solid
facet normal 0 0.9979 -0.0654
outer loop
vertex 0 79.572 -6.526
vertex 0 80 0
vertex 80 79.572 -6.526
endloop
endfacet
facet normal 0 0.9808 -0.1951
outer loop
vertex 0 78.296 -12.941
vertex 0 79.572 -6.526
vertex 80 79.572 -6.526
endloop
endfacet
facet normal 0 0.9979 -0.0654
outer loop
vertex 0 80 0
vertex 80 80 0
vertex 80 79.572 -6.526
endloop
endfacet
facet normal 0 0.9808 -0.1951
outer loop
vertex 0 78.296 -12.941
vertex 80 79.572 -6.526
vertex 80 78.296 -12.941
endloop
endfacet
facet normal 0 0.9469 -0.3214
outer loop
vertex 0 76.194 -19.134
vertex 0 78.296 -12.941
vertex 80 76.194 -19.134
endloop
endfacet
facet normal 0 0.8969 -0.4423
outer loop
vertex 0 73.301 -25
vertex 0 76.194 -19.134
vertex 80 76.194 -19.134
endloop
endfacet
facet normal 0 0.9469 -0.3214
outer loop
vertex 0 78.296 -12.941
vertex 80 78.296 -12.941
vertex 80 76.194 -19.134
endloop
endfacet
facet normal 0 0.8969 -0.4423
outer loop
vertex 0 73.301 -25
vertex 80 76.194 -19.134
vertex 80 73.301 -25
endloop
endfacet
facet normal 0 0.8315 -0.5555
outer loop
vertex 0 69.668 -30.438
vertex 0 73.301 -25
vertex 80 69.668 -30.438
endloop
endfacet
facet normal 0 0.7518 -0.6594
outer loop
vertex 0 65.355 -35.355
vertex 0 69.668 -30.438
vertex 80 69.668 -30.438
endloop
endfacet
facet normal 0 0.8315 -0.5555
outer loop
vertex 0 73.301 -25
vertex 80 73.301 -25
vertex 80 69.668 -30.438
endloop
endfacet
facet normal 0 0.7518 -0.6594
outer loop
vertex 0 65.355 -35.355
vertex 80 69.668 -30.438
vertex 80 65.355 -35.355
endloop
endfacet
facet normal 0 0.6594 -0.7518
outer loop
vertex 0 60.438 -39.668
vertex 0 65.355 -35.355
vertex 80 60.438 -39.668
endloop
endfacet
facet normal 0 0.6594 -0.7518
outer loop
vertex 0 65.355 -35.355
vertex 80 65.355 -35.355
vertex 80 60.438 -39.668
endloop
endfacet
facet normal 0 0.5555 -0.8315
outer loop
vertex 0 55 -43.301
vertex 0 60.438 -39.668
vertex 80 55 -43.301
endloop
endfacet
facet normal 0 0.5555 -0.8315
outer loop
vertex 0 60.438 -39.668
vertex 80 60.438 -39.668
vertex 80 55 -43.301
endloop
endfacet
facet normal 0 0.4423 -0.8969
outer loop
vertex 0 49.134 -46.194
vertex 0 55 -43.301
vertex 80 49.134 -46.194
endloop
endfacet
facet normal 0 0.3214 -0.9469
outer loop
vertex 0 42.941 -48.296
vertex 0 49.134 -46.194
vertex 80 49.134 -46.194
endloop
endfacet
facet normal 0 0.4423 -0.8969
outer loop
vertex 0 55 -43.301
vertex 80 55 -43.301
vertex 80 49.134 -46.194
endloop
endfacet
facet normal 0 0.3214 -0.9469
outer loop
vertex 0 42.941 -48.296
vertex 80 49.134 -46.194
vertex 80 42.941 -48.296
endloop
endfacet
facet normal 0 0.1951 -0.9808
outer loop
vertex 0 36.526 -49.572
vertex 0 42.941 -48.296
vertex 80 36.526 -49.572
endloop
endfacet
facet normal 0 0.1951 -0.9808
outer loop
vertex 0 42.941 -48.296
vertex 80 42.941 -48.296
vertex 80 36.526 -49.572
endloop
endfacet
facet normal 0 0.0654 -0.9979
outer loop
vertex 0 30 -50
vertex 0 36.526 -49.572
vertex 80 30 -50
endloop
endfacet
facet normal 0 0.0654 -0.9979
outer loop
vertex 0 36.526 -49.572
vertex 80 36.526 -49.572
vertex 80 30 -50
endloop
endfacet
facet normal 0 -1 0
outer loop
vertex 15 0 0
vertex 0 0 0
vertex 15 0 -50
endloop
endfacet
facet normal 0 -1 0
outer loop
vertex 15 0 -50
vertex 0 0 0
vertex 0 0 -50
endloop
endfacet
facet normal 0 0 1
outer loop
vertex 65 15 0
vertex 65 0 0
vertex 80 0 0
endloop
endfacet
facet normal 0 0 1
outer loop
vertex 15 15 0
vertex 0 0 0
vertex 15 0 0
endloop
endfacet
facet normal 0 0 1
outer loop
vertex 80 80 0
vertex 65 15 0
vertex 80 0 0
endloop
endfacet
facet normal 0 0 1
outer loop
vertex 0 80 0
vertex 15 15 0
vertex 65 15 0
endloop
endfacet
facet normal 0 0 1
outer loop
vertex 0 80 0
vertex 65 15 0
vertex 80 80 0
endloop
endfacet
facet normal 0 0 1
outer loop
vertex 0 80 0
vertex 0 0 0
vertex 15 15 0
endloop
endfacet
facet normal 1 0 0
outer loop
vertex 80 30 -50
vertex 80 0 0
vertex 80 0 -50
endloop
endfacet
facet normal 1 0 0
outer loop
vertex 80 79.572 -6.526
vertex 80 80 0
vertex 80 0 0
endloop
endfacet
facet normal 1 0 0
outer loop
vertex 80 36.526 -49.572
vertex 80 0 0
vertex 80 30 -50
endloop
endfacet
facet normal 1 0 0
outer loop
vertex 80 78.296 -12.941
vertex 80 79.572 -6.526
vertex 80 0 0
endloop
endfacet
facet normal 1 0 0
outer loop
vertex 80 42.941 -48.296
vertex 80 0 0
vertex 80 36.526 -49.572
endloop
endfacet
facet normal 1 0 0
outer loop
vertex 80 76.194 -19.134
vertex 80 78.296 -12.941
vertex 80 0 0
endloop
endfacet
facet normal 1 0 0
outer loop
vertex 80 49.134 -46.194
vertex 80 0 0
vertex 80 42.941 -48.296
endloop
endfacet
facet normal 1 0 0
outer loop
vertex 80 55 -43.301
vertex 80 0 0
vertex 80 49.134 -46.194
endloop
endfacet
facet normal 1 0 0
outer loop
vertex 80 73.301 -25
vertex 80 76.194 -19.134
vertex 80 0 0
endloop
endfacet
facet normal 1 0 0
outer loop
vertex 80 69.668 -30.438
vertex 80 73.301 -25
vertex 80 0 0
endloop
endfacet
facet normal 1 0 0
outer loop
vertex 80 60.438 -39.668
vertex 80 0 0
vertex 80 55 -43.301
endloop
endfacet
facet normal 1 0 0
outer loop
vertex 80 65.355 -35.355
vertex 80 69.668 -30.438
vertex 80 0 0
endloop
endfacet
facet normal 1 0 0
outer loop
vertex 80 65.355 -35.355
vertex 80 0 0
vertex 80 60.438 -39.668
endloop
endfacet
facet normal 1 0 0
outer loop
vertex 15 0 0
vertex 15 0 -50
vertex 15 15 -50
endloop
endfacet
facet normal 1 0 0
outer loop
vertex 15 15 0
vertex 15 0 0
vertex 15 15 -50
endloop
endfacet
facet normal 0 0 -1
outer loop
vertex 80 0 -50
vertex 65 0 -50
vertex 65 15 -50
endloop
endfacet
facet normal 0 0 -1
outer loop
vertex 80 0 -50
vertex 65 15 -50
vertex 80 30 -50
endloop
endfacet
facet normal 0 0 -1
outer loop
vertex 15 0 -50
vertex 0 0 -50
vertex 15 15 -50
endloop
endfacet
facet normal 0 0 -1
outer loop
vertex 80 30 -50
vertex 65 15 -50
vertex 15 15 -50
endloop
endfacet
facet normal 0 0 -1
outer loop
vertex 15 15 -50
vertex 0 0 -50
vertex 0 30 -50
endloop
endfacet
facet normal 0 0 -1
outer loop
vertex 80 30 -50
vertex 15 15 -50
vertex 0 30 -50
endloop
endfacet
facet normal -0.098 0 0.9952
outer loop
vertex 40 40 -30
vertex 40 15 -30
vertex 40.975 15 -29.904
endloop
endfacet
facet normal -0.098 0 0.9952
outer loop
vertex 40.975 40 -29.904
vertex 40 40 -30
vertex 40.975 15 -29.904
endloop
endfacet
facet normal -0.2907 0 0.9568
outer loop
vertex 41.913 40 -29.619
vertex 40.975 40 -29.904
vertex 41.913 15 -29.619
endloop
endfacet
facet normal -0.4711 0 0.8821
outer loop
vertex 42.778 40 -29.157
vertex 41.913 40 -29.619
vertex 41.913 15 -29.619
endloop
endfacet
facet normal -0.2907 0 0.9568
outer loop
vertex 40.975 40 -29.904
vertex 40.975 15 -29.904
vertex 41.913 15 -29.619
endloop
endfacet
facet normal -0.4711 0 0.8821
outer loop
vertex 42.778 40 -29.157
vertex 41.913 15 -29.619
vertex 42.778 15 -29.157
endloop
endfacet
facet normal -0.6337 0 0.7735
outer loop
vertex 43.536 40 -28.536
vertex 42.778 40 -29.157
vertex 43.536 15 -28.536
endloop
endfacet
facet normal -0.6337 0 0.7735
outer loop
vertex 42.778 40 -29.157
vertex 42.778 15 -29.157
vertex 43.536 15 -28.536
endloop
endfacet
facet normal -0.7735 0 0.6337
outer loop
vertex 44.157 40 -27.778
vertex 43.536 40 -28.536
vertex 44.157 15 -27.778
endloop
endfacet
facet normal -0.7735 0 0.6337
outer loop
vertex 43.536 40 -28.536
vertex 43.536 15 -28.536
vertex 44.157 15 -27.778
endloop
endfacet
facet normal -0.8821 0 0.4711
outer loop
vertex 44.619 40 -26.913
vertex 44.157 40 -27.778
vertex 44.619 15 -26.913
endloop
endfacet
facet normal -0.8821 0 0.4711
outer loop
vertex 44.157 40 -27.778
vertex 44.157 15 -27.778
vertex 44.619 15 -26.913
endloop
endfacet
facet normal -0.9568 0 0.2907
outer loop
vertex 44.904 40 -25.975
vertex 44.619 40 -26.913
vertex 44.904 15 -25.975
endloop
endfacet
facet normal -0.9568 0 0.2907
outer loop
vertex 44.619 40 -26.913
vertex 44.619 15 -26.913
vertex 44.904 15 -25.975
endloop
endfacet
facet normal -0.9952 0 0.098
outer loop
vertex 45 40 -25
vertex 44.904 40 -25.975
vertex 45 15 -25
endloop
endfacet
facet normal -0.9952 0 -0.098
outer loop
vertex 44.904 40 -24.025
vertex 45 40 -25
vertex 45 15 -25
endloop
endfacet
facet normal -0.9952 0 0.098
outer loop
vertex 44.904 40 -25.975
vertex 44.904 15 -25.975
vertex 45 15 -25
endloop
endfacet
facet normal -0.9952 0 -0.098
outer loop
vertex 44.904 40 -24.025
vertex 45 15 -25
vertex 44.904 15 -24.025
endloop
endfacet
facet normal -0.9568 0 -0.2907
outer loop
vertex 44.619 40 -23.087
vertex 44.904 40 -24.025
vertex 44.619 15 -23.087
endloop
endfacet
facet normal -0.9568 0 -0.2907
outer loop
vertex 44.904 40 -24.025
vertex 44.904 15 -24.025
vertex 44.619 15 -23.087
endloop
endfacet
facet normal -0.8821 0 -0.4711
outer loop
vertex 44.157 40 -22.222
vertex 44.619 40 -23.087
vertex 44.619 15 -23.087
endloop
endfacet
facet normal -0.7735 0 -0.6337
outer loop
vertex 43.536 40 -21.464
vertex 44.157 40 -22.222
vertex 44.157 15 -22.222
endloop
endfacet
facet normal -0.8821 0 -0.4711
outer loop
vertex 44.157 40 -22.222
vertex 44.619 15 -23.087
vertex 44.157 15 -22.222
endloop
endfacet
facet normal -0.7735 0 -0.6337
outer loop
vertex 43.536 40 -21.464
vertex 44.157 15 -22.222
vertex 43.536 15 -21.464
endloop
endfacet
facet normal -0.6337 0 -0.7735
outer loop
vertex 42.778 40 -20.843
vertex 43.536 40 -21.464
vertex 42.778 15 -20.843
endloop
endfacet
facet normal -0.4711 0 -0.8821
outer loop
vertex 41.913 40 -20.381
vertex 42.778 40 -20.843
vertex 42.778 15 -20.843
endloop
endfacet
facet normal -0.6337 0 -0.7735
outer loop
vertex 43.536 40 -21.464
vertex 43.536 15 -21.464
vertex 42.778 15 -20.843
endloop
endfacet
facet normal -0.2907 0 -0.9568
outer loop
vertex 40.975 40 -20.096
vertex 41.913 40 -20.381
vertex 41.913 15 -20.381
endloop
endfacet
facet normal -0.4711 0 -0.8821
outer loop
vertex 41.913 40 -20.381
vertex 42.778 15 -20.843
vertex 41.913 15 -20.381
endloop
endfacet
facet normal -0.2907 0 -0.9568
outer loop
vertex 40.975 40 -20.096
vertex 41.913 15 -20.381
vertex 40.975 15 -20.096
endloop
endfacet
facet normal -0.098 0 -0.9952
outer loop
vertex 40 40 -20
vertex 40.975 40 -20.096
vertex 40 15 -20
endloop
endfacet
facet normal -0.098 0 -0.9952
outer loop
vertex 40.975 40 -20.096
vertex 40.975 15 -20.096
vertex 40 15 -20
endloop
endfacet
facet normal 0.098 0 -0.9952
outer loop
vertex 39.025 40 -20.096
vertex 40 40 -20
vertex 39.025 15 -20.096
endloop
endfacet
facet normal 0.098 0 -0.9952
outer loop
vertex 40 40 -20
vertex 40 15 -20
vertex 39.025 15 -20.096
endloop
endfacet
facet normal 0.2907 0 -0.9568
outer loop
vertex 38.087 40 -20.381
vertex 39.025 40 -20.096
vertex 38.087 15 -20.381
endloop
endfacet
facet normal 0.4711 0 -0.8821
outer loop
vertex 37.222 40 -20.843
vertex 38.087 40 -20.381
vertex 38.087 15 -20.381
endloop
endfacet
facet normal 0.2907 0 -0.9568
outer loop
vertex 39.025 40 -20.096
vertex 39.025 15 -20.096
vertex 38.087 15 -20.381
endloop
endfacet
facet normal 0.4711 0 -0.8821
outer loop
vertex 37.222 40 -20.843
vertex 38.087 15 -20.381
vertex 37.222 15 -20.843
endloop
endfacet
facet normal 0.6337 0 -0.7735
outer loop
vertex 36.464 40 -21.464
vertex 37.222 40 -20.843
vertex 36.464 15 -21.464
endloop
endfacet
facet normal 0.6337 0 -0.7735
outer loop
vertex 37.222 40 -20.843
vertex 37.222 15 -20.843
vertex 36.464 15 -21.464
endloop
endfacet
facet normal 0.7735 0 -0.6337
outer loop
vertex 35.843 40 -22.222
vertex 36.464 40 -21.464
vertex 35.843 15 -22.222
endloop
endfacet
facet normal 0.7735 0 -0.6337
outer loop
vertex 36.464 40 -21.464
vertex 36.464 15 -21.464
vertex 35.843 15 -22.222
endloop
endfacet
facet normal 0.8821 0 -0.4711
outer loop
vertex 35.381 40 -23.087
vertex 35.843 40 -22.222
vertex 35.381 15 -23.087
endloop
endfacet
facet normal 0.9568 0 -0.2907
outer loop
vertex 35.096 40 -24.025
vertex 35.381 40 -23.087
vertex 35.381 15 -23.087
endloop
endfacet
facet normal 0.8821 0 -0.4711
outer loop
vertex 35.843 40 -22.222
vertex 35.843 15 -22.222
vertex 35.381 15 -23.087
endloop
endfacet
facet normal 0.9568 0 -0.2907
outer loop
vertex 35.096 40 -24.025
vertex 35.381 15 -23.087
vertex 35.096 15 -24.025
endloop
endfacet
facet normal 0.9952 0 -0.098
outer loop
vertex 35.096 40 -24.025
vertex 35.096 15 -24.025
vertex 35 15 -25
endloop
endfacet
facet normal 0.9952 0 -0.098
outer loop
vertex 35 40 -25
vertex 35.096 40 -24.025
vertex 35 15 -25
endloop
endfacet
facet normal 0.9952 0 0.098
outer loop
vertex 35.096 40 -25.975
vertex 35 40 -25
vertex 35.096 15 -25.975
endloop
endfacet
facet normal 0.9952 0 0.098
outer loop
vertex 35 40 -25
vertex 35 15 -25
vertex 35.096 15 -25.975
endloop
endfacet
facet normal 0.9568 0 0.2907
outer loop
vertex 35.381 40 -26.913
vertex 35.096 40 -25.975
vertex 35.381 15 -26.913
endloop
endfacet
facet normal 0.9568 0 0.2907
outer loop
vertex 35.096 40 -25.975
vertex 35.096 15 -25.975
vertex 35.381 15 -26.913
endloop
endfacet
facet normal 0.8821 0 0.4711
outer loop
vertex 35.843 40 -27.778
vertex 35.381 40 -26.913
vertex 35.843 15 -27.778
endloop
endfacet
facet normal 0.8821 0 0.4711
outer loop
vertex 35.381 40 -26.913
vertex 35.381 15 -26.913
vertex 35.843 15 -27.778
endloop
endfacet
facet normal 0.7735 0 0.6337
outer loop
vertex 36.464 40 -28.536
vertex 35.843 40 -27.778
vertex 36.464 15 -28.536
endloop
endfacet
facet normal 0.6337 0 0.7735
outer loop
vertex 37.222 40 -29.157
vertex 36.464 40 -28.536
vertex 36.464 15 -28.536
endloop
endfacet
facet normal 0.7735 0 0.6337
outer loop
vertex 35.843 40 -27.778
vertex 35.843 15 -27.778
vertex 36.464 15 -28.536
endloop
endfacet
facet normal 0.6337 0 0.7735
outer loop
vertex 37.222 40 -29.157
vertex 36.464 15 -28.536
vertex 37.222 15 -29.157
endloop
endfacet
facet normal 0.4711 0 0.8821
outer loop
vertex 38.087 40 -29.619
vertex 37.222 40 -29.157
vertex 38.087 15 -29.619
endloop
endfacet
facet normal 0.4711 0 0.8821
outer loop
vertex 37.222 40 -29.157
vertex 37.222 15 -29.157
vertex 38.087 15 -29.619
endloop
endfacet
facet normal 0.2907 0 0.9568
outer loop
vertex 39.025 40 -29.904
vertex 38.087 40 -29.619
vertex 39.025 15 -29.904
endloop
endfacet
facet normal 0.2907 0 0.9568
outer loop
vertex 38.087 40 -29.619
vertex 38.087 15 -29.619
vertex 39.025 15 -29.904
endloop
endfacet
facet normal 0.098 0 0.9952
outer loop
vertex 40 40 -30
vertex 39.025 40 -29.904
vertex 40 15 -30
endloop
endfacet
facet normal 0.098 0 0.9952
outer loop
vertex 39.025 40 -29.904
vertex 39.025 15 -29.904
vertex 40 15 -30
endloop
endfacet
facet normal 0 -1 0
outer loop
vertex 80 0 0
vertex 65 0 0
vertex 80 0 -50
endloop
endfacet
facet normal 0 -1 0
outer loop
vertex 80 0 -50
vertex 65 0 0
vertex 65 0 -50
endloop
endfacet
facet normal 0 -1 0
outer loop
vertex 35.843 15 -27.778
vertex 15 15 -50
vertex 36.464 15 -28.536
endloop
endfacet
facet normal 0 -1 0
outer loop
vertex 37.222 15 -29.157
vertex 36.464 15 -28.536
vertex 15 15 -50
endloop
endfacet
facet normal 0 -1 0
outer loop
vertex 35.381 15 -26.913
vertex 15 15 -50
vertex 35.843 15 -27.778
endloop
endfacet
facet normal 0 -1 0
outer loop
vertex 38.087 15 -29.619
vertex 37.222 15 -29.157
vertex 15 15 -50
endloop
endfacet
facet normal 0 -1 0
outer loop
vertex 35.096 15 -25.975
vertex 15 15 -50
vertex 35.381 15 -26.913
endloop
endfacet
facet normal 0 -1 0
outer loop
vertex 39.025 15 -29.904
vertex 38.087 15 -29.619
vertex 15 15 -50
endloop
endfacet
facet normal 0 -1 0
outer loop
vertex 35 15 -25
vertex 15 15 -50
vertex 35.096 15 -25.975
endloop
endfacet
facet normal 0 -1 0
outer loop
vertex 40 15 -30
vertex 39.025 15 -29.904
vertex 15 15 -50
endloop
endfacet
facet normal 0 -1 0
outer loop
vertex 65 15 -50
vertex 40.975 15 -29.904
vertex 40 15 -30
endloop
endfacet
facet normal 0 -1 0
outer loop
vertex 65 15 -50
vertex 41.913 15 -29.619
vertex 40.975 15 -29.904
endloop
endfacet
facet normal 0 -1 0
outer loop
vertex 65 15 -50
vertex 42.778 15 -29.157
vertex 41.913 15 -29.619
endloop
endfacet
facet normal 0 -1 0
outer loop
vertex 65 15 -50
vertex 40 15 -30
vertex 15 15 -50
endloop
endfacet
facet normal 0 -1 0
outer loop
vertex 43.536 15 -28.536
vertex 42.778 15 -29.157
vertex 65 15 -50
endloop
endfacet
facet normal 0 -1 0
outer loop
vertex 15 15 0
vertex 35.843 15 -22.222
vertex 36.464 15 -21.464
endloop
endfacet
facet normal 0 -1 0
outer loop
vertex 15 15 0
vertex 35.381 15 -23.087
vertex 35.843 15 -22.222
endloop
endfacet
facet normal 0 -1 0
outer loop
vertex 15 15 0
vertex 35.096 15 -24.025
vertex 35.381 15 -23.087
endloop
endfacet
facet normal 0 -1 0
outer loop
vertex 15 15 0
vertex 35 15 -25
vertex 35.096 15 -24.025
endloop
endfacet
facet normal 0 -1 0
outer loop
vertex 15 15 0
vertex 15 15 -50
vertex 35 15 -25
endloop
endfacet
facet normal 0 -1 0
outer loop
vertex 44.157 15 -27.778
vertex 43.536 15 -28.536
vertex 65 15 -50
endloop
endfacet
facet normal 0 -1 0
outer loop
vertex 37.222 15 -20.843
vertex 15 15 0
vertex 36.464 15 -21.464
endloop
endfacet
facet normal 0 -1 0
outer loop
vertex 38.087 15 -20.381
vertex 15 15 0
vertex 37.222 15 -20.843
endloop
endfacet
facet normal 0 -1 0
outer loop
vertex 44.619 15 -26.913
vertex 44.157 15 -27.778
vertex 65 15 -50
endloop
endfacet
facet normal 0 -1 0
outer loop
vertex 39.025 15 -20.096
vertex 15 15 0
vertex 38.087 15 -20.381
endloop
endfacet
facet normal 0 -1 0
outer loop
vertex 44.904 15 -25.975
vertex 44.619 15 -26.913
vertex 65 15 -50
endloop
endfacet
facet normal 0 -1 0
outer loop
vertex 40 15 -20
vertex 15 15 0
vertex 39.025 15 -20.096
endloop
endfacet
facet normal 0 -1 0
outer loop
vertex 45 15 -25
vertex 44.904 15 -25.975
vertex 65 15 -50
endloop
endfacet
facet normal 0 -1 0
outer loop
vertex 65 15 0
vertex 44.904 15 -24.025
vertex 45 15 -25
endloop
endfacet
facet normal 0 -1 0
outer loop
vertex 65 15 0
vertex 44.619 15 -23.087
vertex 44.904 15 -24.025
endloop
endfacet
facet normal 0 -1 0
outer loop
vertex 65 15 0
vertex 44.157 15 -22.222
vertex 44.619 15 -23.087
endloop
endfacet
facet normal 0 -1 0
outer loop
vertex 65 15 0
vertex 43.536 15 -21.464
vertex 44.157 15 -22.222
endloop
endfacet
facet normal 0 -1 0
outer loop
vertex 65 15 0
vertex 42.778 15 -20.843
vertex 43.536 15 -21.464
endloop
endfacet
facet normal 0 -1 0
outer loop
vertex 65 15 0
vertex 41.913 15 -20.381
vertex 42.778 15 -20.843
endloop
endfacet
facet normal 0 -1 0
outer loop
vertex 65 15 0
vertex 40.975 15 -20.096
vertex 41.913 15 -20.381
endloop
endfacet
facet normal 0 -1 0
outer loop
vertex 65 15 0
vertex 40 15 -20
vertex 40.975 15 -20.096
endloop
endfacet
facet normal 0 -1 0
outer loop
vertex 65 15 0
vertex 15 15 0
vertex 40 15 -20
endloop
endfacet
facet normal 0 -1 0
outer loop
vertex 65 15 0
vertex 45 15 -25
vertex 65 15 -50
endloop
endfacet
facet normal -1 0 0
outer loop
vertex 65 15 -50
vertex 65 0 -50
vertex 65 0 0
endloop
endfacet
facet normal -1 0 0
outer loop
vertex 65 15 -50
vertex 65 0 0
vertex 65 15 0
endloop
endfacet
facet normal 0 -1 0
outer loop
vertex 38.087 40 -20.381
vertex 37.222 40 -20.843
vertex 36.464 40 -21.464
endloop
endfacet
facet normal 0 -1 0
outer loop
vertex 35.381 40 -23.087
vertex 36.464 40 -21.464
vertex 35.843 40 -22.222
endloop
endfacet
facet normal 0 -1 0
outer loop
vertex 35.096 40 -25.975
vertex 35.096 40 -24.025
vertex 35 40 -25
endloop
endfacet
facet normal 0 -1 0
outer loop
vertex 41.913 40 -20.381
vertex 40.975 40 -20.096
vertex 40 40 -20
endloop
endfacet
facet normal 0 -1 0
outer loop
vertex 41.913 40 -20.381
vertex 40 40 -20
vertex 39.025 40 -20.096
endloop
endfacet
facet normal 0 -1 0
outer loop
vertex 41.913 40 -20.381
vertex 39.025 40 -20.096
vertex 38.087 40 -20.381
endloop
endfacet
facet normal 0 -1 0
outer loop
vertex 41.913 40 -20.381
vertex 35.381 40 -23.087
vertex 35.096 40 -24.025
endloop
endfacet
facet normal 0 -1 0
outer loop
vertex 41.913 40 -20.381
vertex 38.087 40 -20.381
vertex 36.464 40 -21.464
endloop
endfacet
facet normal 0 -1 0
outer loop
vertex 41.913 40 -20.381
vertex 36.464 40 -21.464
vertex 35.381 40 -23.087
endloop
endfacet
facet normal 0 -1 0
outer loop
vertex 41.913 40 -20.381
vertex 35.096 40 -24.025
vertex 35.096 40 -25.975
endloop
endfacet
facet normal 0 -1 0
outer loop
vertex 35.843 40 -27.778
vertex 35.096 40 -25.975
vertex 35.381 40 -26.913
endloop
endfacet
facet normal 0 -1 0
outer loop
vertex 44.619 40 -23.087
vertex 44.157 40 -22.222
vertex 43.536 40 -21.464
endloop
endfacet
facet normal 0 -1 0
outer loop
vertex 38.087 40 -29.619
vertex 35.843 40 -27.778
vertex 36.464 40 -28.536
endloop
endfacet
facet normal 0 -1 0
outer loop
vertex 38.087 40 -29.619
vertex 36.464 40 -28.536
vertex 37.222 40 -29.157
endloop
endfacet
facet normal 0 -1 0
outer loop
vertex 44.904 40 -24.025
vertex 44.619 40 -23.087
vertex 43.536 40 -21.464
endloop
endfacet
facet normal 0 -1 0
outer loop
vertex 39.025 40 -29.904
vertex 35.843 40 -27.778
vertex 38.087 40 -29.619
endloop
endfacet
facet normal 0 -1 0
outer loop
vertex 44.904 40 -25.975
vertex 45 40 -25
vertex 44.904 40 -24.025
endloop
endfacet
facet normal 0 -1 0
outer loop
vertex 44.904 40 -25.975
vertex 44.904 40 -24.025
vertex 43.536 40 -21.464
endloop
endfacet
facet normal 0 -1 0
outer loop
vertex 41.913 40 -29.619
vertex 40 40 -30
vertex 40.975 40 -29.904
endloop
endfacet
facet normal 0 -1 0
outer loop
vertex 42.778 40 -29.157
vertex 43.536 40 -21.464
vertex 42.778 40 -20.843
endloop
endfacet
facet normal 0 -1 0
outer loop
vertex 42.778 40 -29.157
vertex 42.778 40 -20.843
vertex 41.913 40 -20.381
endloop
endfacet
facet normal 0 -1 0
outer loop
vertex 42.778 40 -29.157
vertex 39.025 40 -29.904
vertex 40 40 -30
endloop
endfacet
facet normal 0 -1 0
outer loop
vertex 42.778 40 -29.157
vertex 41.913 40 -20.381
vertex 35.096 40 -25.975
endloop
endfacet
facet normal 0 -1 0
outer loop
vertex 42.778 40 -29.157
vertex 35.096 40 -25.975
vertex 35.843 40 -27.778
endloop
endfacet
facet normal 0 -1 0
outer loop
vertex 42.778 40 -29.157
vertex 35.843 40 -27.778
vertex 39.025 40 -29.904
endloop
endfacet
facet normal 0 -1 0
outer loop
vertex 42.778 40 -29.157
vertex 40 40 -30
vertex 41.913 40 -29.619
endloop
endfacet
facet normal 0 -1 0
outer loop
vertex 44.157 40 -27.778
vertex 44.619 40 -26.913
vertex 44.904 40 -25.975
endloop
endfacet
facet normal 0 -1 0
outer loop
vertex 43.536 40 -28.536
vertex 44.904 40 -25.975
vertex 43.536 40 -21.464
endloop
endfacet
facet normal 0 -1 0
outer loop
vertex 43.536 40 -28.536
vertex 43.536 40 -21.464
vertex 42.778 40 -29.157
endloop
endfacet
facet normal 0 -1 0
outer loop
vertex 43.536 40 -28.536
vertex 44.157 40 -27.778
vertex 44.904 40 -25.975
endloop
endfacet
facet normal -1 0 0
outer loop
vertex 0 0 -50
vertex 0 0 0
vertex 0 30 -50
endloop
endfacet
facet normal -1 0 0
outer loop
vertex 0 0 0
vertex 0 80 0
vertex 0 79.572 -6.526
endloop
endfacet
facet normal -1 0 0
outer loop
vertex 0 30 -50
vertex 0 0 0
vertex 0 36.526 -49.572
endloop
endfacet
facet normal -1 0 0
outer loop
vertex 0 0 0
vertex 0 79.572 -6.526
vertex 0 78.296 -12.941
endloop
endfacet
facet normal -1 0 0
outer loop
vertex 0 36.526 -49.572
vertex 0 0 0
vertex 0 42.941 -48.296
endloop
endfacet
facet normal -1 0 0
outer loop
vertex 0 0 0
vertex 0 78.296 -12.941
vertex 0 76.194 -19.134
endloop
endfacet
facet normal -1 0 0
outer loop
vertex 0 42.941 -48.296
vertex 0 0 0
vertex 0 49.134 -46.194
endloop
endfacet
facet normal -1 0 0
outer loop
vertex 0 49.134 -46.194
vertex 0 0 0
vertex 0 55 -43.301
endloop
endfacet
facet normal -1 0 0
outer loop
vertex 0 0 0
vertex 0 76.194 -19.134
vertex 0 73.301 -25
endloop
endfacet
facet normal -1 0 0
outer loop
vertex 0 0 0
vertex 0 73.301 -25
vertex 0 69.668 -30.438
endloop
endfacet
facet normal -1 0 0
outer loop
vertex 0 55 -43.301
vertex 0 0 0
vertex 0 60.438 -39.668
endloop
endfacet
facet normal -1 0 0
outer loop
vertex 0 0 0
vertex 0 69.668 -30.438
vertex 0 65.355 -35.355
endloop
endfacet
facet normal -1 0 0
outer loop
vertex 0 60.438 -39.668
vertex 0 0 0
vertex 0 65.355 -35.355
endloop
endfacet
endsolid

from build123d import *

# Parameters (mm, degrees)
SKETCH1_W           = 50
SKETCH1_H           = 80
BOSS_EXTRUDE1_DEPTH = 80
SKETCH4_W           = 50
SKETCH4_H           = 15
CUT_EXTRUDE2_DEPTH  = 124.693168769
FILLET1_R           = 50
SKETCH5_R           = 5
CUT_EXTRUDE3_DEPTH  = 25


with BuildPart() as part:
    # Sketch1 → Boss-Extrude1 (new body)
    with BuildSketch(Plane(origin=(0, 0, 0), x_dir=(0, 0, -1), z_dir=(1, 0, 0))):
        with Locations((25, 40)):
            Rectangle(SKETCH1_W, SKETCH1_H)
    extrude(amount=BOSS_EXTRUDE1_DEPTH)

    # Sketch4 → Cut-Extrude2 (cut, through all)
    with BuildSketch(Plane.XY):
        with Locations((40, 7.5)):
            Rectangle(SKETCH4_W, SKETCH4_H)
    extrude(amount=-CUT_EXTRUDE2_DEPTH, mode=Mode.SUBTRACT)

    # Fillet1
    fillet1_edges = [part.edges().sort_by_distance(p)[0] for p in [
        (40, 80, -50),
    ]]
    fillet(fillet1_edges, radius=FILLET1_R - 0.0001)  # a hair under: the kernel refuses the full size

    # Sketch5 → Cut-Extrude3 (cut)
    with BuildSketch(Plane.XZ.offset(-15)):
        with Locations(Location((40, -25, 0), (0, 0, 270))):
            Circle(SKETCH5_R)
    extrude(amount=-CUT_EXTRUDE3_DEPTH, mode=Mode.SUBTRACT)


solid = part.part
